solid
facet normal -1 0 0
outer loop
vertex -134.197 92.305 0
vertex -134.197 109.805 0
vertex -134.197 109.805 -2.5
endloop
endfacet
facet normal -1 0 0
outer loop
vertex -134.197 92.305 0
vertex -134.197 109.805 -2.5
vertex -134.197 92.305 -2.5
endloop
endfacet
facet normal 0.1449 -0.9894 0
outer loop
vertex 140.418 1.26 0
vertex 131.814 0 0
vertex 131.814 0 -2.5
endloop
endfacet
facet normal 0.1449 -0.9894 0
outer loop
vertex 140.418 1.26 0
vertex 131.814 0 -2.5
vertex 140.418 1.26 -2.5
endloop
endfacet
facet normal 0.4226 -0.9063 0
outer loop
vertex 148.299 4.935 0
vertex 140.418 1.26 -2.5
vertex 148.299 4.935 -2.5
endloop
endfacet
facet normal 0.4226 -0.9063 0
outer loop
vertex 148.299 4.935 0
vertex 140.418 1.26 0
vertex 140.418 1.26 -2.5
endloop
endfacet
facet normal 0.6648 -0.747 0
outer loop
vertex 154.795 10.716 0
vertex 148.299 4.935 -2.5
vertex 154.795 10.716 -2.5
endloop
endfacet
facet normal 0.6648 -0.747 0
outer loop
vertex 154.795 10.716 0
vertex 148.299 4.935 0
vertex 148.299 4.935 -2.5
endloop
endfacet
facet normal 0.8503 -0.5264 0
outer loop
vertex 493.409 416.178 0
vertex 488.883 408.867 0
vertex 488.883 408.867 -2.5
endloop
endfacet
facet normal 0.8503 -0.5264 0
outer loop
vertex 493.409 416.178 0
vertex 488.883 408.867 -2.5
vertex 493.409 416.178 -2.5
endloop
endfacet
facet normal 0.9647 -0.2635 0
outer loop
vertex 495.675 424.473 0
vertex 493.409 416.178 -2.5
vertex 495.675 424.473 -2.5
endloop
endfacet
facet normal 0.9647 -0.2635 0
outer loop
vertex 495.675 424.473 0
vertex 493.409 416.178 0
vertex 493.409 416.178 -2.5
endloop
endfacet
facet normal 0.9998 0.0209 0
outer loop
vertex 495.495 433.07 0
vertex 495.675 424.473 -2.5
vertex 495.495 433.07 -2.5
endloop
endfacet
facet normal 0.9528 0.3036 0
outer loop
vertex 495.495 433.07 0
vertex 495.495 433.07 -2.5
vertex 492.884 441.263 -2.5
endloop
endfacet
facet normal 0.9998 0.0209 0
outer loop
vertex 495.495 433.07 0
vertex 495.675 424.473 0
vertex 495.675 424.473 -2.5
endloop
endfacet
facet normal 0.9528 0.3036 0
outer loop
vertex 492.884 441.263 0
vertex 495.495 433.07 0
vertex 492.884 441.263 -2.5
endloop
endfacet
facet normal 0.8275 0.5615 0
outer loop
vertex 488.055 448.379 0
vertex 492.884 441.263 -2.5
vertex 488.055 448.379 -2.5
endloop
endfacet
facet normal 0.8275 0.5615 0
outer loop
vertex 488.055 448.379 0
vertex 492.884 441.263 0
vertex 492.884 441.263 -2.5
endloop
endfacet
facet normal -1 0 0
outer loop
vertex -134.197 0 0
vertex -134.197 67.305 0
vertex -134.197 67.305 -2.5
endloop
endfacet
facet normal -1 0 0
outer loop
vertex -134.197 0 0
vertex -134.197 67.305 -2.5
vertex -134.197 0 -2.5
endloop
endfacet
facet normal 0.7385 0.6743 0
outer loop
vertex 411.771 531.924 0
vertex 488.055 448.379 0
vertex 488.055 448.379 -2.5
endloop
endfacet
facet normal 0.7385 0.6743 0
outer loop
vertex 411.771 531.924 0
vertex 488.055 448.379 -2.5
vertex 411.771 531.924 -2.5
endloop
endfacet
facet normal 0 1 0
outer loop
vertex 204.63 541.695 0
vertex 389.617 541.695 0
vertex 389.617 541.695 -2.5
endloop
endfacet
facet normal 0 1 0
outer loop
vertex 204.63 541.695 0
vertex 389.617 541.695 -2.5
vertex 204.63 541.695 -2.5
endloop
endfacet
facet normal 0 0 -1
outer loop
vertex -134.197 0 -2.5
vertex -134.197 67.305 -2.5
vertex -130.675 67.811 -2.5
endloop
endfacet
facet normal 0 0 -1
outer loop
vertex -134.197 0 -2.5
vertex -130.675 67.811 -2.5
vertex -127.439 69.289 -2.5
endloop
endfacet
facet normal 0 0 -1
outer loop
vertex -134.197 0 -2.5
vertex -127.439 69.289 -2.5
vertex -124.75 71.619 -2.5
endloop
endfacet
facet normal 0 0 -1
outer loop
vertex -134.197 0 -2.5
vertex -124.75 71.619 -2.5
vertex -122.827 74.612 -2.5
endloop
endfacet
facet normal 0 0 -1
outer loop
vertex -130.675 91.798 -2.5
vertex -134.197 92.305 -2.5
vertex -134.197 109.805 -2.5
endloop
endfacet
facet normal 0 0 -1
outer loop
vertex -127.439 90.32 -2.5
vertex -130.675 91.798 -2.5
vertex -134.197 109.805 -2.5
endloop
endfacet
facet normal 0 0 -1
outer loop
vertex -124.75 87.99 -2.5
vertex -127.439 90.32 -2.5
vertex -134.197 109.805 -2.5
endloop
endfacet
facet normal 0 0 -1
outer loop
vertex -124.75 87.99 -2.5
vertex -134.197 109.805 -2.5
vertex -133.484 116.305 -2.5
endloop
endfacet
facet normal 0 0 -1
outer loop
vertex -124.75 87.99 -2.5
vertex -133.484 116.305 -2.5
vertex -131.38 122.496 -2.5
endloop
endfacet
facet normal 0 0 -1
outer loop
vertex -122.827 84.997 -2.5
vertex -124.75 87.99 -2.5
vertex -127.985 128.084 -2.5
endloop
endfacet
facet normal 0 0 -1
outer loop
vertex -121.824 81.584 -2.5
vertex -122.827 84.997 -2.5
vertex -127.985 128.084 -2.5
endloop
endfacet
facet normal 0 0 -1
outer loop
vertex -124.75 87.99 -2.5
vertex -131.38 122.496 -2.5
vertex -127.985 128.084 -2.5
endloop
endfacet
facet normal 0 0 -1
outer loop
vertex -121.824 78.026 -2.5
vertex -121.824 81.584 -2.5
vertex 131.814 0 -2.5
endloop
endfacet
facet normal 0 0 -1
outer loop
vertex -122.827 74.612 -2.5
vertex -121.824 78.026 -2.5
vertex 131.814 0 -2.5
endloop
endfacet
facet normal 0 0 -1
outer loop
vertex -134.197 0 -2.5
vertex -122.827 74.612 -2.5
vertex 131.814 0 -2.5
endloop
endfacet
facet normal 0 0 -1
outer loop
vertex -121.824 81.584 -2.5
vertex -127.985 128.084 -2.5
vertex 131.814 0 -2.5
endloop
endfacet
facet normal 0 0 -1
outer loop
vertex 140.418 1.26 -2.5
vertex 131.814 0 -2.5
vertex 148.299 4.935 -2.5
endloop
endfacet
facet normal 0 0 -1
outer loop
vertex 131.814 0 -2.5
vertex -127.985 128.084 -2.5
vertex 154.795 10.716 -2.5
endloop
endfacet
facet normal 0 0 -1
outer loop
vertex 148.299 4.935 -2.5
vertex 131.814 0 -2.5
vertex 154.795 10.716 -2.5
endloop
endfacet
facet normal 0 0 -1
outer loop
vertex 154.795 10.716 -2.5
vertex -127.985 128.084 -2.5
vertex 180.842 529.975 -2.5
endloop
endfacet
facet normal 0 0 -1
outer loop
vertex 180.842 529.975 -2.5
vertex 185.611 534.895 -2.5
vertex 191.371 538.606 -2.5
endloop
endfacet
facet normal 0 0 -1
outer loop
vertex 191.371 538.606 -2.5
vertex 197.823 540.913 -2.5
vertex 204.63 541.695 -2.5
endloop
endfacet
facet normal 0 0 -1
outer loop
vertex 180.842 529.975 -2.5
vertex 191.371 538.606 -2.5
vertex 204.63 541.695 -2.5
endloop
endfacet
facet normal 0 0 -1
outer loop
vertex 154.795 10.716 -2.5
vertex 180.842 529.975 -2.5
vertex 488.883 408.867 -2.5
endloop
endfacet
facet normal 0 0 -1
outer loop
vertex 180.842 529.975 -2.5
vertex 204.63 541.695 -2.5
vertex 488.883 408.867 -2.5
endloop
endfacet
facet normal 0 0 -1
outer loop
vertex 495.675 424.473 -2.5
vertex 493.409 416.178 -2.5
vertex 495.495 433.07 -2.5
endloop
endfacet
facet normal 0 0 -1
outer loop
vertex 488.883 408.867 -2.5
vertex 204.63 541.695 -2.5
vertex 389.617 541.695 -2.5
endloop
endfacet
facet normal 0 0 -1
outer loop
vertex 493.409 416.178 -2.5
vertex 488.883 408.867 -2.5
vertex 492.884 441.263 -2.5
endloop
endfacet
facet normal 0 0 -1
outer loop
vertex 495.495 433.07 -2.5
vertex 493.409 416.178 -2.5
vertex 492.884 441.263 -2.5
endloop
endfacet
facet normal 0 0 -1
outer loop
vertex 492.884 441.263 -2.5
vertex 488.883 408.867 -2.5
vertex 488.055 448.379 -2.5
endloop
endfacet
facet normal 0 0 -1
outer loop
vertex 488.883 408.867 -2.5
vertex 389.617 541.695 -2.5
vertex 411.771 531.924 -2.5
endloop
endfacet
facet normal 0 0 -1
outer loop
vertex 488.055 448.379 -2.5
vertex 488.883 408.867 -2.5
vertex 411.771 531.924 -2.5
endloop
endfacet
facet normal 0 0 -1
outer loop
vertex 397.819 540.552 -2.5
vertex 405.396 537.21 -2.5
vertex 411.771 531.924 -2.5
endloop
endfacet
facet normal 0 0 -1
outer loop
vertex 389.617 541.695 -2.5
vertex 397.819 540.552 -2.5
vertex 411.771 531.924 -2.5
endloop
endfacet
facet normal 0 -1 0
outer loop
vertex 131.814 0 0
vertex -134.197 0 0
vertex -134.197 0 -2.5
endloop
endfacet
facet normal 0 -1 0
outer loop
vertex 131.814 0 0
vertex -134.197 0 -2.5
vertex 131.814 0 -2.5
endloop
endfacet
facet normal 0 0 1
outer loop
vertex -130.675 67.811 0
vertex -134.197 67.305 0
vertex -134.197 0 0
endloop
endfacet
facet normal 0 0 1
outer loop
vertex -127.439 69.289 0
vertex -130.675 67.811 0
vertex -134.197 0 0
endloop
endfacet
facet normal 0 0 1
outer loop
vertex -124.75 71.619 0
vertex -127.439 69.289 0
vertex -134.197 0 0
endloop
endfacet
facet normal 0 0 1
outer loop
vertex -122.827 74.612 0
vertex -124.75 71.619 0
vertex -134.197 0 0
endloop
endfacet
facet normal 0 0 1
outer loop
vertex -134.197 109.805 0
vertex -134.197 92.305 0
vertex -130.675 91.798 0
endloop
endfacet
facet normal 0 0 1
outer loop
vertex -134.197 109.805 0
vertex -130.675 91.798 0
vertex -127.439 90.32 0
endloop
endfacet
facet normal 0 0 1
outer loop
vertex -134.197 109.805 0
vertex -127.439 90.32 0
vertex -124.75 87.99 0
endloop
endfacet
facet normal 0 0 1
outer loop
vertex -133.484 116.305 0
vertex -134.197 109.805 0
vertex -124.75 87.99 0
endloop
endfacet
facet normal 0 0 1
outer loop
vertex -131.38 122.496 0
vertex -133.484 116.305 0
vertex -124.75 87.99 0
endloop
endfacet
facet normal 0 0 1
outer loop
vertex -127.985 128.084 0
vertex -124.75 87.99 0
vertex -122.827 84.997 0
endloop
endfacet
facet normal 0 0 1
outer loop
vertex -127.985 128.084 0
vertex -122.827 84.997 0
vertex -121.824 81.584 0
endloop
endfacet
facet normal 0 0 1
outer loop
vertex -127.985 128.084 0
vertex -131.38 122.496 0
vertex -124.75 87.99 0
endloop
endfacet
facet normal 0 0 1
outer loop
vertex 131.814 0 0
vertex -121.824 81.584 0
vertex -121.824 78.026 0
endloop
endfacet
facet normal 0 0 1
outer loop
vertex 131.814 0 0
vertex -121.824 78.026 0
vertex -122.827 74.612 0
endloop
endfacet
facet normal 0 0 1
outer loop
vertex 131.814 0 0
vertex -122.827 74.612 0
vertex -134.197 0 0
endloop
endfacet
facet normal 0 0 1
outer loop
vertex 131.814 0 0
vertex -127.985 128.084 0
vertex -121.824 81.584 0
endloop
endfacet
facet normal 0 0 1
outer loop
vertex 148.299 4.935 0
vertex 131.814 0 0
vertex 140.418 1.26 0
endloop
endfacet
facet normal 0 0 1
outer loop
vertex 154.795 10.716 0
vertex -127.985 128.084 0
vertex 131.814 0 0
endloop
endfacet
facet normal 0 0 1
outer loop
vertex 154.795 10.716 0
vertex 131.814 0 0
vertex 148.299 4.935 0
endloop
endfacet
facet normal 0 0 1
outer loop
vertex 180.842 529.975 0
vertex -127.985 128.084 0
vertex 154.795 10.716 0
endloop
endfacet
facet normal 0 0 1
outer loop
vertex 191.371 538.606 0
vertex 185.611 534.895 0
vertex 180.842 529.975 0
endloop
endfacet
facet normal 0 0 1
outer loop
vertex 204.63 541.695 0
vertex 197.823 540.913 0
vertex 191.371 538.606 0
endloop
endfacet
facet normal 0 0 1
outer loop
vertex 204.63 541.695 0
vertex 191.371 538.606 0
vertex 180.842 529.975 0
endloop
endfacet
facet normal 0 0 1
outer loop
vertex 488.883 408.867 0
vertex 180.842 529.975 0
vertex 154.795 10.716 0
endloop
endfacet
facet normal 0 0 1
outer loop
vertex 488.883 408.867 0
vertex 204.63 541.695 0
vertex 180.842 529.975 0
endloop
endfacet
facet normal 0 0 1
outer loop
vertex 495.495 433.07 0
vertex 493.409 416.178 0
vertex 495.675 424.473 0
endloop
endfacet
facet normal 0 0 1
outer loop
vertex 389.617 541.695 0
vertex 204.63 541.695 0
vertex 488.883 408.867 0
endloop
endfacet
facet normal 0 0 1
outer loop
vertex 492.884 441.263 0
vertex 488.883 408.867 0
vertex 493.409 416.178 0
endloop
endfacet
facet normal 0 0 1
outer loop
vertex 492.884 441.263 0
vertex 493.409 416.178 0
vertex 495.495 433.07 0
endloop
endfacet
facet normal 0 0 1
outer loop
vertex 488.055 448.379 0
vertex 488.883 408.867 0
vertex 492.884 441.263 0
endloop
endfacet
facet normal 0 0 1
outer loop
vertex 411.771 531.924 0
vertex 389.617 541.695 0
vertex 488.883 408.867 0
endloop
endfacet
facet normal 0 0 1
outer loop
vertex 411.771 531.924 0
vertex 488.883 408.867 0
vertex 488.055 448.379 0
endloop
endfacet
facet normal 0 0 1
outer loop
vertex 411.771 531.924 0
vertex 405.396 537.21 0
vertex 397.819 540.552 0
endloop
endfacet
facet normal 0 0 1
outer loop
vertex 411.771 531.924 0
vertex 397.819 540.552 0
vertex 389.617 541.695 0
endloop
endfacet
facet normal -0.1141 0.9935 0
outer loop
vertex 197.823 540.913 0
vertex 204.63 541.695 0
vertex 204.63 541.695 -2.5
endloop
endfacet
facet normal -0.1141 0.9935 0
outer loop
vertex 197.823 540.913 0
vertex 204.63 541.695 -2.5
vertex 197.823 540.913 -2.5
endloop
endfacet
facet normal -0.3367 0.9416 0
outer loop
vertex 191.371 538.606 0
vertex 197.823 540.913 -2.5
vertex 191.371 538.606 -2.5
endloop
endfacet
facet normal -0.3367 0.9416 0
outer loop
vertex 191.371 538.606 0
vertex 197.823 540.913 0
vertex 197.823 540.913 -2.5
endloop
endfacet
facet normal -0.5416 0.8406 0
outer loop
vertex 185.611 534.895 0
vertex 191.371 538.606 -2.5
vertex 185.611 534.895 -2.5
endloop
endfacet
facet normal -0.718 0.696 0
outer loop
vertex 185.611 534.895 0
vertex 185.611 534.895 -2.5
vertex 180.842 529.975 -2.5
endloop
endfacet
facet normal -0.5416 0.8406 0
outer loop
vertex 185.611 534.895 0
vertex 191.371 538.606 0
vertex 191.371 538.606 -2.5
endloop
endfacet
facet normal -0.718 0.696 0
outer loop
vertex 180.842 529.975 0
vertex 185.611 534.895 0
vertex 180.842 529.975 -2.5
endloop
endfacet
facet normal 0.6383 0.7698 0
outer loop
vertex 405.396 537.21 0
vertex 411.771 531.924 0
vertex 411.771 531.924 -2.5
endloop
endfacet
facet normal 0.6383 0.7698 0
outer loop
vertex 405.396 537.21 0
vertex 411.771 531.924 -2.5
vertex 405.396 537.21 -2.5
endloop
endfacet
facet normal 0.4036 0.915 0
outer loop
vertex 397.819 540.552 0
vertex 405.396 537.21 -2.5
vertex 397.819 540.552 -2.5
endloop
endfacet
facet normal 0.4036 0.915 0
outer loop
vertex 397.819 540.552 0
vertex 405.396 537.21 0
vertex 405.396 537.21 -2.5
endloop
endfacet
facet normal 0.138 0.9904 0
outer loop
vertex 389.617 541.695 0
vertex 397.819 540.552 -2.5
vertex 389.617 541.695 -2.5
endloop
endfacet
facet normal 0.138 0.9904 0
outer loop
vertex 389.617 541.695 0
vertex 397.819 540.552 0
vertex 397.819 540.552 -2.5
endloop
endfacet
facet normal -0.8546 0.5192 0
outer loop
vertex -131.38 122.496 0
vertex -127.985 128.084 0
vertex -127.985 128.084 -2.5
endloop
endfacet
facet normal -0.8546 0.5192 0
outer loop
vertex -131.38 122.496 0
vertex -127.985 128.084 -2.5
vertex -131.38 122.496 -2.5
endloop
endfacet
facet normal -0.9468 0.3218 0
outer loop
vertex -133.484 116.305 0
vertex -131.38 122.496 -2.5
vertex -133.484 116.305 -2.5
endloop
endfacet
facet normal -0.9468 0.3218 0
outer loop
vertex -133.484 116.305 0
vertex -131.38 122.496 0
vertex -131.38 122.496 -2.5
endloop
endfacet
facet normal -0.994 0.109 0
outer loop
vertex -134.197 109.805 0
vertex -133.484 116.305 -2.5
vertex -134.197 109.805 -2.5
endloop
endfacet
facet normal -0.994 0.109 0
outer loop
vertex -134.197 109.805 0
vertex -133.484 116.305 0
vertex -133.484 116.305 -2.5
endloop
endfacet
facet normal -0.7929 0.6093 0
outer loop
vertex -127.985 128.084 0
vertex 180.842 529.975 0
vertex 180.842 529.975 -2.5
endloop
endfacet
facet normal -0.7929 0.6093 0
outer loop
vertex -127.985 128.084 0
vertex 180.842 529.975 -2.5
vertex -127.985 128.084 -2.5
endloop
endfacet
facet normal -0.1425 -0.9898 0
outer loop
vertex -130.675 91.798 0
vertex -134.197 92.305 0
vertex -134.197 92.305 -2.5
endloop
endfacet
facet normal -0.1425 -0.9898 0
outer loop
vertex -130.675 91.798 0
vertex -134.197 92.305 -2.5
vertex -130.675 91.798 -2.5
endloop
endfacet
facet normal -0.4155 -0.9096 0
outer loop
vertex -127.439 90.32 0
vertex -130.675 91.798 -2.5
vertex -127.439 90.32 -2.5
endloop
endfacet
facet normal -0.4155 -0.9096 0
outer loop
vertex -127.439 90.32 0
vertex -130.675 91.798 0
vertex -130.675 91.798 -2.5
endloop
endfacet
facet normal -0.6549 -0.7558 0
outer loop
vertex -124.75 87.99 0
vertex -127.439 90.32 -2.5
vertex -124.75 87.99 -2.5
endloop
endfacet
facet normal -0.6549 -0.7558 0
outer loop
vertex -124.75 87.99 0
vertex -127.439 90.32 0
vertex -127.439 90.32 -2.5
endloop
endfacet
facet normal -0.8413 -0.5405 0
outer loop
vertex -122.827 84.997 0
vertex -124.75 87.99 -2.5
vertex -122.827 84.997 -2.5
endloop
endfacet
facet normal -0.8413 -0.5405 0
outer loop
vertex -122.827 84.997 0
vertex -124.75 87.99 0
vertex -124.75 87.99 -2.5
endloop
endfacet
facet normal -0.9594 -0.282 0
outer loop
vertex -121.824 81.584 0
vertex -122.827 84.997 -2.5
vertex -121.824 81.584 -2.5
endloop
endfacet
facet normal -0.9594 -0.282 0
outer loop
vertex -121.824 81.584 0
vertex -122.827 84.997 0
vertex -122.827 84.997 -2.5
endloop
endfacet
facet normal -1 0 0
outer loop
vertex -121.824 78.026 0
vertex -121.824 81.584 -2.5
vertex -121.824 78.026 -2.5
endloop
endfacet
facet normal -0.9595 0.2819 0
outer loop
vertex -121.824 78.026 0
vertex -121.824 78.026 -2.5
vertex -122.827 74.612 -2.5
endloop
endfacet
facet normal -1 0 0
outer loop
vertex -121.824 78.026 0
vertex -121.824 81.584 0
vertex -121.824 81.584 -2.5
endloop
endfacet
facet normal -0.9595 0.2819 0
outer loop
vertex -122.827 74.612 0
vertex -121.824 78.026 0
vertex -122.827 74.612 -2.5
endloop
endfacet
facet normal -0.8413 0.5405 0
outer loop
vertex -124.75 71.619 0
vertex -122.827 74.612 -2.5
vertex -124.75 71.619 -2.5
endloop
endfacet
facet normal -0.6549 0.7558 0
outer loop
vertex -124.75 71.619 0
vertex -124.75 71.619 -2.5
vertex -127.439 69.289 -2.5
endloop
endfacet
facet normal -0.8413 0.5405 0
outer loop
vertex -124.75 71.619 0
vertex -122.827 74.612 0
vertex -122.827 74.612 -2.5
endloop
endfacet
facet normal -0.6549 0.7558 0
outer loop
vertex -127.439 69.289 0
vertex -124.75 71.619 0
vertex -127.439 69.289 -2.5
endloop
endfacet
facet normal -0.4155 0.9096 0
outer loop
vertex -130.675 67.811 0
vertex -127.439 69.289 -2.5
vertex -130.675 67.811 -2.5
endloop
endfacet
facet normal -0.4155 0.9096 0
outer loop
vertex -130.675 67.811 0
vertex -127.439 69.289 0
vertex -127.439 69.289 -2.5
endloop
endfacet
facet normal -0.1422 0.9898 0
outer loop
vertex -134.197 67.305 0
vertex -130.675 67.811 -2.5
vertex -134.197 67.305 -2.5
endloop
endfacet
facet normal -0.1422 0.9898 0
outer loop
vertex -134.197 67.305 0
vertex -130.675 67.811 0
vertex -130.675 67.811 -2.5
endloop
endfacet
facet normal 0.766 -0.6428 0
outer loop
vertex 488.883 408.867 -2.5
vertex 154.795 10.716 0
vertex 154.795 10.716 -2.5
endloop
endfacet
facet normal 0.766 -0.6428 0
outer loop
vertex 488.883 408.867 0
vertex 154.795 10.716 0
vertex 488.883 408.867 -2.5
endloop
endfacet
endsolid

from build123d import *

# Parameters (mm, degrees)
BASE_FLANGE1_DEPTH = 2.5


# Sheet-metal steps are written as plain solids
with BuildPart() as part:
    # Sketch1 → Base-Flange1 (new body)
    with BuildSketch(Plane.XY):
        with BuildLine():
            Line((-134.197014838, 0), (131.813755418, 0))
            ThreePointArc((131.813755418, 0), (144.49230327, 2.810766389), (154.795088711, 10.716371709))
            Line((154.795088711, 10.716371709), (488.882789575, 408.866589455))
            ThreePointArc((488.882789575, 408.866589455), (495.894882012, 428.778240774), (488.055453139, 448.3789207))
            Line((488.055453139, 448.3789207), (411.771088084, 531.923752399))
            ThreePointArc((411.771088084, 531.923752399), (401.723678511, 539.143738745), (389.617091226, 541.695049445))
            Line((389.617091226, 541.695049445), (204.630312304, 541.695049445))
            ThreePointArc((204.630312304, 541.695049445), (191.371044435, 538.605861688), (180.842467764, 529.974503817))
            Line((180.842467764, 529.974503817), (-127.984859378, 128.084146569))
            ThreePointArc((-127.984859378, 128.084146569), (-132.601550886, 119.457791797), (-134.197014838, 109.804692197))
            Line((-134.197014838, 109.804692197), (-134.197014838, 92.304692197))
            ThreePointArc((-134.197014838, 92.304692197), (-121.697014838, 79.804692197), (-134.197014838, 67.304692197))
            Line((-134.197014838, 67.304692197), (-134.197014838, 0))
        make_face()
    extrude(amount=-BASE_FLANGE1_DEPTH)


solid = part.part
